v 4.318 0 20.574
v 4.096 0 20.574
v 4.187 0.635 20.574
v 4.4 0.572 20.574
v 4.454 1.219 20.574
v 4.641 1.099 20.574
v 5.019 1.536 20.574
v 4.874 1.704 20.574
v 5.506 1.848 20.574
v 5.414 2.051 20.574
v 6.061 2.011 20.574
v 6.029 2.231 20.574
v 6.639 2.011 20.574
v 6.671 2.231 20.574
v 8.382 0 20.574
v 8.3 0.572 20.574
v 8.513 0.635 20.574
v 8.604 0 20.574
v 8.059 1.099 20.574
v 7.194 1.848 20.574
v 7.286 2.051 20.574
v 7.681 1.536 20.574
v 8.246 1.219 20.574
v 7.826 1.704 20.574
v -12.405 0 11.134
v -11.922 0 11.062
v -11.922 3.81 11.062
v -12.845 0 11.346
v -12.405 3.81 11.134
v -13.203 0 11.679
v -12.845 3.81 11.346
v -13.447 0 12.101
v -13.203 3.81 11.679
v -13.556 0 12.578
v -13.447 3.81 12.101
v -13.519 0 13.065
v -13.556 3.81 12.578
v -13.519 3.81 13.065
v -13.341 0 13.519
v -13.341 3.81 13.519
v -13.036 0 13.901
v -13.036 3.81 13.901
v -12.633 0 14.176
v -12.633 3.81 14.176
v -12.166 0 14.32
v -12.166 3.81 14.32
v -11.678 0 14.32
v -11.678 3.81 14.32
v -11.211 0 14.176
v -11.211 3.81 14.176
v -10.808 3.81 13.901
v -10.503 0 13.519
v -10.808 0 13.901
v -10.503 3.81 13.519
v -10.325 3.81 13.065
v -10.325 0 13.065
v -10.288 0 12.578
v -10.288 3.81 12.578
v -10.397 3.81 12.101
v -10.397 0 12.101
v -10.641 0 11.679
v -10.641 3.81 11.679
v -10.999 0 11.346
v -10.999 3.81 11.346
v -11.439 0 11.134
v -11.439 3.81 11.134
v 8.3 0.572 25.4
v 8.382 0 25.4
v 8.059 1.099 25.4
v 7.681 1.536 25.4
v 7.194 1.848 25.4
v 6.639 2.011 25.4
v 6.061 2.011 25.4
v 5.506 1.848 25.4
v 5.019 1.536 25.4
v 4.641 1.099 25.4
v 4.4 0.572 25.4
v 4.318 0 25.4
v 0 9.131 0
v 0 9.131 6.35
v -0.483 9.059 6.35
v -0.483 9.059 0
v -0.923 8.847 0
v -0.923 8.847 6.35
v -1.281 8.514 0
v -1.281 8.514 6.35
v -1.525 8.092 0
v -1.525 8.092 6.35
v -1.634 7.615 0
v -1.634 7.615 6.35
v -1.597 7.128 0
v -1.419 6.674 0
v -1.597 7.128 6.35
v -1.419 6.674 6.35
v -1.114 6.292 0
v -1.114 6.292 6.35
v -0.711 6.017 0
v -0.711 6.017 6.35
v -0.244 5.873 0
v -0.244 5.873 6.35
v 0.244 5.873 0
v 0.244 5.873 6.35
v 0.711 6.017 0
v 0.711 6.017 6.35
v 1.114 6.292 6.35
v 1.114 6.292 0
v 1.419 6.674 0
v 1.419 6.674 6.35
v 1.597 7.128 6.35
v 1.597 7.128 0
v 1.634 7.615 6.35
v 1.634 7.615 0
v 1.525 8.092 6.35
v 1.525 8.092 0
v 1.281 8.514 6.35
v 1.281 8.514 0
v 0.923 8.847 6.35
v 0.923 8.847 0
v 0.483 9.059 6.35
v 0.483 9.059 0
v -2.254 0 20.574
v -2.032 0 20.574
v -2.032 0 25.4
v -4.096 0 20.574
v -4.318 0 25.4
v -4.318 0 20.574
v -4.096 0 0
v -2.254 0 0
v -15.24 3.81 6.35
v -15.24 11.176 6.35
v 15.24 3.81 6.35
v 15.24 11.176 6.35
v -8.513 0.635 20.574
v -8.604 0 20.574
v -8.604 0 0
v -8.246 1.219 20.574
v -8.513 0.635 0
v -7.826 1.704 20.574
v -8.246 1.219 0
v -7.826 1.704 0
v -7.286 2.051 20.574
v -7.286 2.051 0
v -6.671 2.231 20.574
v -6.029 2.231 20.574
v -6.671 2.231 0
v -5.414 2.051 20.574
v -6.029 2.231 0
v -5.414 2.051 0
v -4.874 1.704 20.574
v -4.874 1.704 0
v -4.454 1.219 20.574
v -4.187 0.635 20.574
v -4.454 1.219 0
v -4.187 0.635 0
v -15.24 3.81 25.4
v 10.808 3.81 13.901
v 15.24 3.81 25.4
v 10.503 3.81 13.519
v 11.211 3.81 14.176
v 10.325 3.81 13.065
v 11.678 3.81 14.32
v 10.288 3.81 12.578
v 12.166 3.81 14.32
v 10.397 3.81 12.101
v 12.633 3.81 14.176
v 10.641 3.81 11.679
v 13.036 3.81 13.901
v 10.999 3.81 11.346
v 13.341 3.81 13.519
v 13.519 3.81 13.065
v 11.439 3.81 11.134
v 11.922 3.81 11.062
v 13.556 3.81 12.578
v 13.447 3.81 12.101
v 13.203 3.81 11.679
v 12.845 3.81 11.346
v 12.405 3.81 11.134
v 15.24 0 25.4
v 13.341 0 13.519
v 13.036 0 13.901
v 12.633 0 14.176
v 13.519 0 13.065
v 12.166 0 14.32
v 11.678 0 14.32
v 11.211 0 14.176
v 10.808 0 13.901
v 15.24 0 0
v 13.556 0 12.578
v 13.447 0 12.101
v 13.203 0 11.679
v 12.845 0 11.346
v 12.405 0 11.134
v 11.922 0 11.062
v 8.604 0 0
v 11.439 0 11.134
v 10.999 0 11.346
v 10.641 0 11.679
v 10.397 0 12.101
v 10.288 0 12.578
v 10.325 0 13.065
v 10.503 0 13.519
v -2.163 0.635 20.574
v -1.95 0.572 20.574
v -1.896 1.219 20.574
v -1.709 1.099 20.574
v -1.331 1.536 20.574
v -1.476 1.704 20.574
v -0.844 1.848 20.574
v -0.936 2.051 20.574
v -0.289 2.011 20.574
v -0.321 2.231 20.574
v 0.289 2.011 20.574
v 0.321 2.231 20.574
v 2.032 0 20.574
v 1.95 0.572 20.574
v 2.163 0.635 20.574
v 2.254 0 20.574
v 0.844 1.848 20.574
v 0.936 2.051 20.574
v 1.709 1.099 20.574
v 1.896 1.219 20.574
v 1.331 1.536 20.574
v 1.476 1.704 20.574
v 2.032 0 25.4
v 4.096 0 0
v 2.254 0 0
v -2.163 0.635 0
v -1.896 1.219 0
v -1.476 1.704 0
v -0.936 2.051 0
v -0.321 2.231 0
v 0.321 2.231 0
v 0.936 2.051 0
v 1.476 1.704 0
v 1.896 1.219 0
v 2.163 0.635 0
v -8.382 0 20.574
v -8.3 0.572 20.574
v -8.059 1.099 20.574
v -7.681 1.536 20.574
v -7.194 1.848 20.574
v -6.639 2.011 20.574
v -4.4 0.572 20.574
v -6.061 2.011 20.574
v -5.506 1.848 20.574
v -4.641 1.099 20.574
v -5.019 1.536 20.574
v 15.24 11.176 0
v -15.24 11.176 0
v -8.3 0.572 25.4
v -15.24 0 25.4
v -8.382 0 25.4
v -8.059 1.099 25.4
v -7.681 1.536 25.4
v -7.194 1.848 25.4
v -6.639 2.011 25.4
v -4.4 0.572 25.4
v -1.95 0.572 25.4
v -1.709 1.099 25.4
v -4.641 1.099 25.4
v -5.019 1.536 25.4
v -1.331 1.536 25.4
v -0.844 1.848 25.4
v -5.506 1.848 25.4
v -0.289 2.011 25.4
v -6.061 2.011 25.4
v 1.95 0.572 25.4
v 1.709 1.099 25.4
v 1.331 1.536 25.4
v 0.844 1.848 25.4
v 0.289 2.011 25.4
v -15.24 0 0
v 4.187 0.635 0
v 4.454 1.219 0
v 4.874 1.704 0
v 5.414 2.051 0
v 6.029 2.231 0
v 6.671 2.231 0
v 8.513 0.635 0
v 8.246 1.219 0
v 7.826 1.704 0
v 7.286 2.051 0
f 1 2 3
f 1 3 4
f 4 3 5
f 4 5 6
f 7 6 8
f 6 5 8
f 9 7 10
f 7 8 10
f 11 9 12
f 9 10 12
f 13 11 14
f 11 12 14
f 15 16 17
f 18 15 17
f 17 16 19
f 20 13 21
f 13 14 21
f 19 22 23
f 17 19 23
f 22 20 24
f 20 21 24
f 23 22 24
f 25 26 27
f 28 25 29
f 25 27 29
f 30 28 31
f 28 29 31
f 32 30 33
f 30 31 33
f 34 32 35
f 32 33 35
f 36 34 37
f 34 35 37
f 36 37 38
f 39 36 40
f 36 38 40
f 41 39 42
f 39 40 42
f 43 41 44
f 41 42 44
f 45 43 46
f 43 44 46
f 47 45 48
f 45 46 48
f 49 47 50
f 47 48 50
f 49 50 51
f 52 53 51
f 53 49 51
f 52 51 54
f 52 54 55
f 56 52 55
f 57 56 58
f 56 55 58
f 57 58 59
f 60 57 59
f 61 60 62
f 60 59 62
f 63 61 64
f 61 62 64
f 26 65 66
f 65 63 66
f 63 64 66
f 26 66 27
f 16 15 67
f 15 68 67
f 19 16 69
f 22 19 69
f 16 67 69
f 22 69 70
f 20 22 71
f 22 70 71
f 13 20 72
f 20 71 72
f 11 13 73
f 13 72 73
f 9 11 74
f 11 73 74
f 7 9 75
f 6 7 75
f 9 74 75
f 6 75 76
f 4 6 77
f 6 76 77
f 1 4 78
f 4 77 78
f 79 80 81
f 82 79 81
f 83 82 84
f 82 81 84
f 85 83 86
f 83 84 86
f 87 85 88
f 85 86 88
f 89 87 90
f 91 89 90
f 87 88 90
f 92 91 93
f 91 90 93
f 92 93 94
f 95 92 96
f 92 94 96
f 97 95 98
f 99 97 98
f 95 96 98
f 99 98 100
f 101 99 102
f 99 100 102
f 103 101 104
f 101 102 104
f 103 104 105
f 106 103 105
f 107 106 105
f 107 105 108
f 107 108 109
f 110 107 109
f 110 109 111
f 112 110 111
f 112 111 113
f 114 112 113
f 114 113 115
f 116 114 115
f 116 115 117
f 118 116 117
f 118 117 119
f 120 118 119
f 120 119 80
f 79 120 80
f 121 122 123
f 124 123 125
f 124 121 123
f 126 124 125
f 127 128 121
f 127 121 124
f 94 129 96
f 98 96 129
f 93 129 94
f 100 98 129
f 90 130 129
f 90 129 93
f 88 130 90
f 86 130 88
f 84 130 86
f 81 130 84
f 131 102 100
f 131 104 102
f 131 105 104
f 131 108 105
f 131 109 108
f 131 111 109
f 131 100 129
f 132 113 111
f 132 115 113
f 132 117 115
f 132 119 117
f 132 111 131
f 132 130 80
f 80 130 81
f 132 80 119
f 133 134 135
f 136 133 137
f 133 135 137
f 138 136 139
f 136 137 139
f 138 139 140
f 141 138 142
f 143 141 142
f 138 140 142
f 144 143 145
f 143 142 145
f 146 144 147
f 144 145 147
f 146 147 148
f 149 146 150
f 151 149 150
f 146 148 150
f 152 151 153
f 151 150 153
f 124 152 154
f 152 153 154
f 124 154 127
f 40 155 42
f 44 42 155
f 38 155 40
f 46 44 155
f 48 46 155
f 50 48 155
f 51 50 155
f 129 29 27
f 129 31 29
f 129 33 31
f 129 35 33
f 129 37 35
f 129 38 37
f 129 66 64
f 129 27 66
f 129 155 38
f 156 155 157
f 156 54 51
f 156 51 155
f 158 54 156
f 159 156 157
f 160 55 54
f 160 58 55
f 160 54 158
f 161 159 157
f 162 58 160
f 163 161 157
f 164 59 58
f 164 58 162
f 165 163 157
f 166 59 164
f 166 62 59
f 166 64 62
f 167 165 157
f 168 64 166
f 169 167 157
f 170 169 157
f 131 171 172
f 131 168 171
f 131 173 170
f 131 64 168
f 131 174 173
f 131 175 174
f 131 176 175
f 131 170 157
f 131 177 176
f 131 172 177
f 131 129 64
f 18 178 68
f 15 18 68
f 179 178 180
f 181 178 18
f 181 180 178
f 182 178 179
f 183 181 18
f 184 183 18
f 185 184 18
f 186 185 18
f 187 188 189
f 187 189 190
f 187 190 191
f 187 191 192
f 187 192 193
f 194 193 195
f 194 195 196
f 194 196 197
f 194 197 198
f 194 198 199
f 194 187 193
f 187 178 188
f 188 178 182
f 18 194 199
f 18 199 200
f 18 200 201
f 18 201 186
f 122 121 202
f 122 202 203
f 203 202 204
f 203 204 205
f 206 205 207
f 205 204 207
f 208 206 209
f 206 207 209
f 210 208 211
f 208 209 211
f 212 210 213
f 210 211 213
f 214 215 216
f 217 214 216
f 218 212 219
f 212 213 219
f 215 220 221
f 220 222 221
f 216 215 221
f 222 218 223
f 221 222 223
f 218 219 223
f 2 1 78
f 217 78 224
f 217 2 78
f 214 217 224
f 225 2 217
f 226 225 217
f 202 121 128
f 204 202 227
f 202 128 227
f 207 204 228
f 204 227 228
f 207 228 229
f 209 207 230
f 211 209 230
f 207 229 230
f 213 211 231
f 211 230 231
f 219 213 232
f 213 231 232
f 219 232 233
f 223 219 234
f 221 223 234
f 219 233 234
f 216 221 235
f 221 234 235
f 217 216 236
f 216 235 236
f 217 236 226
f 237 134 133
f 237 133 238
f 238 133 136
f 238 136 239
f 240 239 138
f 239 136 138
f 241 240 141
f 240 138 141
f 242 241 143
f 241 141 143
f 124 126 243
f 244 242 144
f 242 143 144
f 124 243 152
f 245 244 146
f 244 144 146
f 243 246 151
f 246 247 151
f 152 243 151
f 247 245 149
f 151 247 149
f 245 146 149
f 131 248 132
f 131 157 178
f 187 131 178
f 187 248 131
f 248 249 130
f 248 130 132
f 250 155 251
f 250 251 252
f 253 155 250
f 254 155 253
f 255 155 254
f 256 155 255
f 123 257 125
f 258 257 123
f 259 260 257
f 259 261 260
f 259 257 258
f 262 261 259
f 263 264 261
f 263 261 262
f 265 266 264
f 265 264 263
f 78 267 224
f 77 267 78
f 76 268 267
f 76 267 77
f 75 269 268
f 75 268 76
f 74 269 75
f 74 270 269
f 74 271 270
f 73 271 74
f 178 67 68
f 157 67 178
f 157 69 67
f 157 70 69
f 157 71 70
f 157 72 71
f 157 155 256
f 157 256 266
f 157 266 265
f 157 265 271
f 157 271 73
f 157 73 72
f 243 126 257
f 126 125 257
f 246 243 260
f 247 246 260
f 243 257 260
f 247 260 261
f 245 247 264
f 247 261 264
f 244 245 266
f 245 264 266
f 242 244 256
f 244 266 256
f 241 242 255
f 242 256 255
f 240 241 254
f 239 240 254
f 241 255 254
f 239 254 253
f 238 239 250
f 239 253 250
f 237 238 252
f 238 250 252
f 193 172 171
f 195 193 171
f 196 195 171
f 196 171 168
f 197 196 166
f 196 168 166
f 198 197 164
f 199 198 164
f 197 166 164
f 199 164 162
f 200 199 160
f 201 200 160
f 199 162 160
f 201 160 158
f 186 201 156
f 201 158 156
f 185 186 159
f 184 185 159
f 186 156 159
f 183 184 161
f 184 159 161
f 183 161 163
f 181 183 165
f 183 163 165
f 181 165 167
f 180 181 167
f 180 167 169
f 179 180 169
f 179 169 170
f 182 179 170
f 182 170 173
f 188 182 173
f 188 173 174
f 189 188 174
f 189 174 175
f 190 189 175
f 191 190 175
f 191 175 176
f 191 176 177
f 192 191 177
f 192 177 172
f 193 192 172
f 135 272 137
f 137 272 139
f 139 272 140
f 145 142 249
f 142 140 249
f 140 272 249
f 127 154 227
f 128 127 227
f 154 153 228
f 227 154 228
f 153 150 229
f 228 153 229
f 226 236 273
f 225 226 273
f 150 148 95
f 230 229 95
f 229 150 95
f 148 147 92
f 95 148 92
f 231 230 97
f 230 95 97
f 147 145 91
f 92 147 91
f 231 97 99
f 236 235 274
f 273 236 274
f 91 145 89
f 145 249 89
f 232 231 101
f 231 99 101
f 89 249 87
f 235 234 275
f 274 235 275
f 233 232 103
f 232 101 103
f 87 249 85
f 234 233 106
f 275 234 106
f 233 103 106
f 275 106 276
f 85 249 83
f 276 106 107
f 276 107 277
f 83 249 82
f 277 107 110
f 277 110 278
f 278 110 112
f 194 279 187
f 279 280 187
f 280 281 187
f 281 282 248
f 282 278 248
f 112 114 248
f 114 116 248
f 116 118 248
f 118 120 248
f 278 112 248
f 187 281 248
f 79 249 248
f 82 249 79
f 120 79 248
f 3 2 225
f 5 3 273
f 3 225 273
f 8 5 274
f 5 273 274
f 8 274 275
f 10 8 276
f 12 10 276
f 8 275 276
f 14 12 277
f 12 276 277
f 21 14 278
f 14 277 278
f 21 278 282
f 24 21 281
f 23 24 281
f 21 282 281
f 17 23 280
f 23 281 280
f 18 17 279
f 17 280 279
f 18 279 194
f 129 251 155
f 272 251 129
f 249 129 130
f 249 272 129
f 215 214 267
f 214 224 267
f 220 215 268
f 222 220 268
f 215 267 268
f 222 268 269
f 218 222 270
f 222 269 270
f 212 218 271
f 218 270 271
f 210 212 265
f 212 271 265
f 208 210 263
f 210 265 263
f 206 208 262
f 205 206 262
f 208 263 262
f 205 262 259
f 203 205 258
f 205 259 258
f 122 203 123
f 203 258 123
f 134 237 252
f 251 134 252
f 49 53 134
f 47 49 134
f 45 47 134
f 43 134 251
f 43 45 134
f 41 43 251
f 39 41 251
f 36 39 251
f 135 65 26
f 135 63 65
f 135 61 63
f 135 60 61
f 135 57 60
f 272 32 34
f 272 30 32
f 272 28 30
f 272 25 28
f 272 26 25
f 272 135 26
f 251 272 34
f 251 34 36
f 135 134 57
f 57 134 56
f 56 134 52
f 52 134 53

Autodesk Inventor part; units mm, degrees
ref_plane "YZ Plane" through (0, 0, 0) normal (1, 0, 0) x (0, 1, 0)
ref_plane "XZ Plane" through (0, 0, 0) normal (0, 1, 0) x (-1, 0, 0)
ref_plane "XY Plane" through (0, 0, 0) normal (0, 0, 1) x (1, 0, 0)
sketch "Sketch1" plane through (0, 0, 0) normal (0, 0, 1) x (1, 0, 0)
  circle A0 centre (-6.35, 0) radius 2.2543
  circle A1 centre (0, 0) radius 2.2543
  circle A2 centre (6.35, 0) radius 2.2543
  line L0 (-15.24, 3.81) -> (15.24, 3.81)
  line L1 (15.24, 3.81) -> (15.24, 0)
  line L2 (15.24, 0) -> (-15.24, 0)
  line L3 (-15.24, 0) -> (-15.24, 3.81)
  dimension "d0" = 4.5085
  dimension "d3" = 6.35
  dimension "d4" = 6.35
  dimension "d5" = 3.81
  dimension "d6" = 30.48
extrude "Extrusion1" add sketch "Sketch1" along normal blind 25.4 contours L2 A0 | A0 L2 L3 L0 L1 A2 A1 | A1 L2 | A2 L2 picked at (-7.1014, 0.9966) picked at (0.5625, 0.4983) picked at (6.8906, 0.6781)
extrude "Extrusion2" cut sketch "Sketch1" along normal blind 20.574 contours L2 A0 | A0 L2 | L2 A1 | A1 L2 | L2 A2 | A2 L2
sketch "Sketch2" plane through (0, 0, 25.4) normal (0, 0, 1) x (1, 0, 0)
  circle A0 centre (0, 0) radius 2.2543 projected
  circle A1 centre (6.35, 0) radius 2.2543 projected
  circle A2 centre (-6.35, 0) radius 2.2543 projected
  circle A3 centre (-6.35, 0) radius 2.032
  circle A4 centre (0, 0) radius 2.032
  circle A5 centre (6.35, 0) radius 2.032
  dimension "d11" = 4.064
extrude "Extrusion3" cut sketch "Sketch2" against normal blind 4.826 contours A3 | A4 | A5
sketch "Sketch3" plane through (0, 0, 0) normal (0, 1, 0) x (-1, 0, 0)
  line L0 (15.24, 0) -> (-15.24, 0) construction
  line L1 (15.24, 0) -> (15.24, 25.4) construction
  line L2 (-15.24, 25.4) -> (15.24, 25.4) construction
  line L3 (-15.24, 0) -> (-15.24, 25.4) construction
  line L4 (-15.24, 12.7) -> (15.24, 12.7) construction
  line L5 (-8.6043, 20.574) -> (-8.6043, 0) construction
  line L6 (-11.9221, 12.7) -> (-8.6043, 12.7)
  line L7 (-11.9221, 12.7) -> (-15.24, 12.7)
hole "Hole1" at (11.9221, 0, 12.7) direction (0, 1, 0) diameter 3.2766 end through all clearance for "Oval Head Machine Screw" size "#4" standard "Ansi Unified Screw Threads"
mirror "Mirror1" about plane through (0, 0, 0) normal (1, 0, 0) of "Hole1"
sketch "Sketch7" plane through (0, 0, 0) normal (0, 0, 1) x (1, 0, 0)
  line L0 (-15.24, 3.81) -> (15.24, 3.81) projected
  line L1 (15.24, 3.81) -> (-15.24, 3.81)
  line L2 (-15.24, 3.81) -> (-15.24, 11.176)
  line L3 (-15.24, 11.176) -> (15.24, 11.176)
  line L4 (15.24, 11.176) -> (15.24, 3.81)
  line L5 (-15.24, 7.493) -> (15.24, 7.493)
  point P0 (0, 7.493)
  point P1 (0, 0)
  point P2 (0, 7.493)
  dimension "d36" = 3.683
extrude "Extrusion5" add sketch "Sketch7" along normal blind 6.35
hole "Hole2" at (0, 7.493, 0) direction (0, 0, 1) diameter 3.2766 end through all clearance for "Oval Head Machine Screw" size "#4" standard "Ansi Unified Screw Threads"
properties part number "keyhole holder"
